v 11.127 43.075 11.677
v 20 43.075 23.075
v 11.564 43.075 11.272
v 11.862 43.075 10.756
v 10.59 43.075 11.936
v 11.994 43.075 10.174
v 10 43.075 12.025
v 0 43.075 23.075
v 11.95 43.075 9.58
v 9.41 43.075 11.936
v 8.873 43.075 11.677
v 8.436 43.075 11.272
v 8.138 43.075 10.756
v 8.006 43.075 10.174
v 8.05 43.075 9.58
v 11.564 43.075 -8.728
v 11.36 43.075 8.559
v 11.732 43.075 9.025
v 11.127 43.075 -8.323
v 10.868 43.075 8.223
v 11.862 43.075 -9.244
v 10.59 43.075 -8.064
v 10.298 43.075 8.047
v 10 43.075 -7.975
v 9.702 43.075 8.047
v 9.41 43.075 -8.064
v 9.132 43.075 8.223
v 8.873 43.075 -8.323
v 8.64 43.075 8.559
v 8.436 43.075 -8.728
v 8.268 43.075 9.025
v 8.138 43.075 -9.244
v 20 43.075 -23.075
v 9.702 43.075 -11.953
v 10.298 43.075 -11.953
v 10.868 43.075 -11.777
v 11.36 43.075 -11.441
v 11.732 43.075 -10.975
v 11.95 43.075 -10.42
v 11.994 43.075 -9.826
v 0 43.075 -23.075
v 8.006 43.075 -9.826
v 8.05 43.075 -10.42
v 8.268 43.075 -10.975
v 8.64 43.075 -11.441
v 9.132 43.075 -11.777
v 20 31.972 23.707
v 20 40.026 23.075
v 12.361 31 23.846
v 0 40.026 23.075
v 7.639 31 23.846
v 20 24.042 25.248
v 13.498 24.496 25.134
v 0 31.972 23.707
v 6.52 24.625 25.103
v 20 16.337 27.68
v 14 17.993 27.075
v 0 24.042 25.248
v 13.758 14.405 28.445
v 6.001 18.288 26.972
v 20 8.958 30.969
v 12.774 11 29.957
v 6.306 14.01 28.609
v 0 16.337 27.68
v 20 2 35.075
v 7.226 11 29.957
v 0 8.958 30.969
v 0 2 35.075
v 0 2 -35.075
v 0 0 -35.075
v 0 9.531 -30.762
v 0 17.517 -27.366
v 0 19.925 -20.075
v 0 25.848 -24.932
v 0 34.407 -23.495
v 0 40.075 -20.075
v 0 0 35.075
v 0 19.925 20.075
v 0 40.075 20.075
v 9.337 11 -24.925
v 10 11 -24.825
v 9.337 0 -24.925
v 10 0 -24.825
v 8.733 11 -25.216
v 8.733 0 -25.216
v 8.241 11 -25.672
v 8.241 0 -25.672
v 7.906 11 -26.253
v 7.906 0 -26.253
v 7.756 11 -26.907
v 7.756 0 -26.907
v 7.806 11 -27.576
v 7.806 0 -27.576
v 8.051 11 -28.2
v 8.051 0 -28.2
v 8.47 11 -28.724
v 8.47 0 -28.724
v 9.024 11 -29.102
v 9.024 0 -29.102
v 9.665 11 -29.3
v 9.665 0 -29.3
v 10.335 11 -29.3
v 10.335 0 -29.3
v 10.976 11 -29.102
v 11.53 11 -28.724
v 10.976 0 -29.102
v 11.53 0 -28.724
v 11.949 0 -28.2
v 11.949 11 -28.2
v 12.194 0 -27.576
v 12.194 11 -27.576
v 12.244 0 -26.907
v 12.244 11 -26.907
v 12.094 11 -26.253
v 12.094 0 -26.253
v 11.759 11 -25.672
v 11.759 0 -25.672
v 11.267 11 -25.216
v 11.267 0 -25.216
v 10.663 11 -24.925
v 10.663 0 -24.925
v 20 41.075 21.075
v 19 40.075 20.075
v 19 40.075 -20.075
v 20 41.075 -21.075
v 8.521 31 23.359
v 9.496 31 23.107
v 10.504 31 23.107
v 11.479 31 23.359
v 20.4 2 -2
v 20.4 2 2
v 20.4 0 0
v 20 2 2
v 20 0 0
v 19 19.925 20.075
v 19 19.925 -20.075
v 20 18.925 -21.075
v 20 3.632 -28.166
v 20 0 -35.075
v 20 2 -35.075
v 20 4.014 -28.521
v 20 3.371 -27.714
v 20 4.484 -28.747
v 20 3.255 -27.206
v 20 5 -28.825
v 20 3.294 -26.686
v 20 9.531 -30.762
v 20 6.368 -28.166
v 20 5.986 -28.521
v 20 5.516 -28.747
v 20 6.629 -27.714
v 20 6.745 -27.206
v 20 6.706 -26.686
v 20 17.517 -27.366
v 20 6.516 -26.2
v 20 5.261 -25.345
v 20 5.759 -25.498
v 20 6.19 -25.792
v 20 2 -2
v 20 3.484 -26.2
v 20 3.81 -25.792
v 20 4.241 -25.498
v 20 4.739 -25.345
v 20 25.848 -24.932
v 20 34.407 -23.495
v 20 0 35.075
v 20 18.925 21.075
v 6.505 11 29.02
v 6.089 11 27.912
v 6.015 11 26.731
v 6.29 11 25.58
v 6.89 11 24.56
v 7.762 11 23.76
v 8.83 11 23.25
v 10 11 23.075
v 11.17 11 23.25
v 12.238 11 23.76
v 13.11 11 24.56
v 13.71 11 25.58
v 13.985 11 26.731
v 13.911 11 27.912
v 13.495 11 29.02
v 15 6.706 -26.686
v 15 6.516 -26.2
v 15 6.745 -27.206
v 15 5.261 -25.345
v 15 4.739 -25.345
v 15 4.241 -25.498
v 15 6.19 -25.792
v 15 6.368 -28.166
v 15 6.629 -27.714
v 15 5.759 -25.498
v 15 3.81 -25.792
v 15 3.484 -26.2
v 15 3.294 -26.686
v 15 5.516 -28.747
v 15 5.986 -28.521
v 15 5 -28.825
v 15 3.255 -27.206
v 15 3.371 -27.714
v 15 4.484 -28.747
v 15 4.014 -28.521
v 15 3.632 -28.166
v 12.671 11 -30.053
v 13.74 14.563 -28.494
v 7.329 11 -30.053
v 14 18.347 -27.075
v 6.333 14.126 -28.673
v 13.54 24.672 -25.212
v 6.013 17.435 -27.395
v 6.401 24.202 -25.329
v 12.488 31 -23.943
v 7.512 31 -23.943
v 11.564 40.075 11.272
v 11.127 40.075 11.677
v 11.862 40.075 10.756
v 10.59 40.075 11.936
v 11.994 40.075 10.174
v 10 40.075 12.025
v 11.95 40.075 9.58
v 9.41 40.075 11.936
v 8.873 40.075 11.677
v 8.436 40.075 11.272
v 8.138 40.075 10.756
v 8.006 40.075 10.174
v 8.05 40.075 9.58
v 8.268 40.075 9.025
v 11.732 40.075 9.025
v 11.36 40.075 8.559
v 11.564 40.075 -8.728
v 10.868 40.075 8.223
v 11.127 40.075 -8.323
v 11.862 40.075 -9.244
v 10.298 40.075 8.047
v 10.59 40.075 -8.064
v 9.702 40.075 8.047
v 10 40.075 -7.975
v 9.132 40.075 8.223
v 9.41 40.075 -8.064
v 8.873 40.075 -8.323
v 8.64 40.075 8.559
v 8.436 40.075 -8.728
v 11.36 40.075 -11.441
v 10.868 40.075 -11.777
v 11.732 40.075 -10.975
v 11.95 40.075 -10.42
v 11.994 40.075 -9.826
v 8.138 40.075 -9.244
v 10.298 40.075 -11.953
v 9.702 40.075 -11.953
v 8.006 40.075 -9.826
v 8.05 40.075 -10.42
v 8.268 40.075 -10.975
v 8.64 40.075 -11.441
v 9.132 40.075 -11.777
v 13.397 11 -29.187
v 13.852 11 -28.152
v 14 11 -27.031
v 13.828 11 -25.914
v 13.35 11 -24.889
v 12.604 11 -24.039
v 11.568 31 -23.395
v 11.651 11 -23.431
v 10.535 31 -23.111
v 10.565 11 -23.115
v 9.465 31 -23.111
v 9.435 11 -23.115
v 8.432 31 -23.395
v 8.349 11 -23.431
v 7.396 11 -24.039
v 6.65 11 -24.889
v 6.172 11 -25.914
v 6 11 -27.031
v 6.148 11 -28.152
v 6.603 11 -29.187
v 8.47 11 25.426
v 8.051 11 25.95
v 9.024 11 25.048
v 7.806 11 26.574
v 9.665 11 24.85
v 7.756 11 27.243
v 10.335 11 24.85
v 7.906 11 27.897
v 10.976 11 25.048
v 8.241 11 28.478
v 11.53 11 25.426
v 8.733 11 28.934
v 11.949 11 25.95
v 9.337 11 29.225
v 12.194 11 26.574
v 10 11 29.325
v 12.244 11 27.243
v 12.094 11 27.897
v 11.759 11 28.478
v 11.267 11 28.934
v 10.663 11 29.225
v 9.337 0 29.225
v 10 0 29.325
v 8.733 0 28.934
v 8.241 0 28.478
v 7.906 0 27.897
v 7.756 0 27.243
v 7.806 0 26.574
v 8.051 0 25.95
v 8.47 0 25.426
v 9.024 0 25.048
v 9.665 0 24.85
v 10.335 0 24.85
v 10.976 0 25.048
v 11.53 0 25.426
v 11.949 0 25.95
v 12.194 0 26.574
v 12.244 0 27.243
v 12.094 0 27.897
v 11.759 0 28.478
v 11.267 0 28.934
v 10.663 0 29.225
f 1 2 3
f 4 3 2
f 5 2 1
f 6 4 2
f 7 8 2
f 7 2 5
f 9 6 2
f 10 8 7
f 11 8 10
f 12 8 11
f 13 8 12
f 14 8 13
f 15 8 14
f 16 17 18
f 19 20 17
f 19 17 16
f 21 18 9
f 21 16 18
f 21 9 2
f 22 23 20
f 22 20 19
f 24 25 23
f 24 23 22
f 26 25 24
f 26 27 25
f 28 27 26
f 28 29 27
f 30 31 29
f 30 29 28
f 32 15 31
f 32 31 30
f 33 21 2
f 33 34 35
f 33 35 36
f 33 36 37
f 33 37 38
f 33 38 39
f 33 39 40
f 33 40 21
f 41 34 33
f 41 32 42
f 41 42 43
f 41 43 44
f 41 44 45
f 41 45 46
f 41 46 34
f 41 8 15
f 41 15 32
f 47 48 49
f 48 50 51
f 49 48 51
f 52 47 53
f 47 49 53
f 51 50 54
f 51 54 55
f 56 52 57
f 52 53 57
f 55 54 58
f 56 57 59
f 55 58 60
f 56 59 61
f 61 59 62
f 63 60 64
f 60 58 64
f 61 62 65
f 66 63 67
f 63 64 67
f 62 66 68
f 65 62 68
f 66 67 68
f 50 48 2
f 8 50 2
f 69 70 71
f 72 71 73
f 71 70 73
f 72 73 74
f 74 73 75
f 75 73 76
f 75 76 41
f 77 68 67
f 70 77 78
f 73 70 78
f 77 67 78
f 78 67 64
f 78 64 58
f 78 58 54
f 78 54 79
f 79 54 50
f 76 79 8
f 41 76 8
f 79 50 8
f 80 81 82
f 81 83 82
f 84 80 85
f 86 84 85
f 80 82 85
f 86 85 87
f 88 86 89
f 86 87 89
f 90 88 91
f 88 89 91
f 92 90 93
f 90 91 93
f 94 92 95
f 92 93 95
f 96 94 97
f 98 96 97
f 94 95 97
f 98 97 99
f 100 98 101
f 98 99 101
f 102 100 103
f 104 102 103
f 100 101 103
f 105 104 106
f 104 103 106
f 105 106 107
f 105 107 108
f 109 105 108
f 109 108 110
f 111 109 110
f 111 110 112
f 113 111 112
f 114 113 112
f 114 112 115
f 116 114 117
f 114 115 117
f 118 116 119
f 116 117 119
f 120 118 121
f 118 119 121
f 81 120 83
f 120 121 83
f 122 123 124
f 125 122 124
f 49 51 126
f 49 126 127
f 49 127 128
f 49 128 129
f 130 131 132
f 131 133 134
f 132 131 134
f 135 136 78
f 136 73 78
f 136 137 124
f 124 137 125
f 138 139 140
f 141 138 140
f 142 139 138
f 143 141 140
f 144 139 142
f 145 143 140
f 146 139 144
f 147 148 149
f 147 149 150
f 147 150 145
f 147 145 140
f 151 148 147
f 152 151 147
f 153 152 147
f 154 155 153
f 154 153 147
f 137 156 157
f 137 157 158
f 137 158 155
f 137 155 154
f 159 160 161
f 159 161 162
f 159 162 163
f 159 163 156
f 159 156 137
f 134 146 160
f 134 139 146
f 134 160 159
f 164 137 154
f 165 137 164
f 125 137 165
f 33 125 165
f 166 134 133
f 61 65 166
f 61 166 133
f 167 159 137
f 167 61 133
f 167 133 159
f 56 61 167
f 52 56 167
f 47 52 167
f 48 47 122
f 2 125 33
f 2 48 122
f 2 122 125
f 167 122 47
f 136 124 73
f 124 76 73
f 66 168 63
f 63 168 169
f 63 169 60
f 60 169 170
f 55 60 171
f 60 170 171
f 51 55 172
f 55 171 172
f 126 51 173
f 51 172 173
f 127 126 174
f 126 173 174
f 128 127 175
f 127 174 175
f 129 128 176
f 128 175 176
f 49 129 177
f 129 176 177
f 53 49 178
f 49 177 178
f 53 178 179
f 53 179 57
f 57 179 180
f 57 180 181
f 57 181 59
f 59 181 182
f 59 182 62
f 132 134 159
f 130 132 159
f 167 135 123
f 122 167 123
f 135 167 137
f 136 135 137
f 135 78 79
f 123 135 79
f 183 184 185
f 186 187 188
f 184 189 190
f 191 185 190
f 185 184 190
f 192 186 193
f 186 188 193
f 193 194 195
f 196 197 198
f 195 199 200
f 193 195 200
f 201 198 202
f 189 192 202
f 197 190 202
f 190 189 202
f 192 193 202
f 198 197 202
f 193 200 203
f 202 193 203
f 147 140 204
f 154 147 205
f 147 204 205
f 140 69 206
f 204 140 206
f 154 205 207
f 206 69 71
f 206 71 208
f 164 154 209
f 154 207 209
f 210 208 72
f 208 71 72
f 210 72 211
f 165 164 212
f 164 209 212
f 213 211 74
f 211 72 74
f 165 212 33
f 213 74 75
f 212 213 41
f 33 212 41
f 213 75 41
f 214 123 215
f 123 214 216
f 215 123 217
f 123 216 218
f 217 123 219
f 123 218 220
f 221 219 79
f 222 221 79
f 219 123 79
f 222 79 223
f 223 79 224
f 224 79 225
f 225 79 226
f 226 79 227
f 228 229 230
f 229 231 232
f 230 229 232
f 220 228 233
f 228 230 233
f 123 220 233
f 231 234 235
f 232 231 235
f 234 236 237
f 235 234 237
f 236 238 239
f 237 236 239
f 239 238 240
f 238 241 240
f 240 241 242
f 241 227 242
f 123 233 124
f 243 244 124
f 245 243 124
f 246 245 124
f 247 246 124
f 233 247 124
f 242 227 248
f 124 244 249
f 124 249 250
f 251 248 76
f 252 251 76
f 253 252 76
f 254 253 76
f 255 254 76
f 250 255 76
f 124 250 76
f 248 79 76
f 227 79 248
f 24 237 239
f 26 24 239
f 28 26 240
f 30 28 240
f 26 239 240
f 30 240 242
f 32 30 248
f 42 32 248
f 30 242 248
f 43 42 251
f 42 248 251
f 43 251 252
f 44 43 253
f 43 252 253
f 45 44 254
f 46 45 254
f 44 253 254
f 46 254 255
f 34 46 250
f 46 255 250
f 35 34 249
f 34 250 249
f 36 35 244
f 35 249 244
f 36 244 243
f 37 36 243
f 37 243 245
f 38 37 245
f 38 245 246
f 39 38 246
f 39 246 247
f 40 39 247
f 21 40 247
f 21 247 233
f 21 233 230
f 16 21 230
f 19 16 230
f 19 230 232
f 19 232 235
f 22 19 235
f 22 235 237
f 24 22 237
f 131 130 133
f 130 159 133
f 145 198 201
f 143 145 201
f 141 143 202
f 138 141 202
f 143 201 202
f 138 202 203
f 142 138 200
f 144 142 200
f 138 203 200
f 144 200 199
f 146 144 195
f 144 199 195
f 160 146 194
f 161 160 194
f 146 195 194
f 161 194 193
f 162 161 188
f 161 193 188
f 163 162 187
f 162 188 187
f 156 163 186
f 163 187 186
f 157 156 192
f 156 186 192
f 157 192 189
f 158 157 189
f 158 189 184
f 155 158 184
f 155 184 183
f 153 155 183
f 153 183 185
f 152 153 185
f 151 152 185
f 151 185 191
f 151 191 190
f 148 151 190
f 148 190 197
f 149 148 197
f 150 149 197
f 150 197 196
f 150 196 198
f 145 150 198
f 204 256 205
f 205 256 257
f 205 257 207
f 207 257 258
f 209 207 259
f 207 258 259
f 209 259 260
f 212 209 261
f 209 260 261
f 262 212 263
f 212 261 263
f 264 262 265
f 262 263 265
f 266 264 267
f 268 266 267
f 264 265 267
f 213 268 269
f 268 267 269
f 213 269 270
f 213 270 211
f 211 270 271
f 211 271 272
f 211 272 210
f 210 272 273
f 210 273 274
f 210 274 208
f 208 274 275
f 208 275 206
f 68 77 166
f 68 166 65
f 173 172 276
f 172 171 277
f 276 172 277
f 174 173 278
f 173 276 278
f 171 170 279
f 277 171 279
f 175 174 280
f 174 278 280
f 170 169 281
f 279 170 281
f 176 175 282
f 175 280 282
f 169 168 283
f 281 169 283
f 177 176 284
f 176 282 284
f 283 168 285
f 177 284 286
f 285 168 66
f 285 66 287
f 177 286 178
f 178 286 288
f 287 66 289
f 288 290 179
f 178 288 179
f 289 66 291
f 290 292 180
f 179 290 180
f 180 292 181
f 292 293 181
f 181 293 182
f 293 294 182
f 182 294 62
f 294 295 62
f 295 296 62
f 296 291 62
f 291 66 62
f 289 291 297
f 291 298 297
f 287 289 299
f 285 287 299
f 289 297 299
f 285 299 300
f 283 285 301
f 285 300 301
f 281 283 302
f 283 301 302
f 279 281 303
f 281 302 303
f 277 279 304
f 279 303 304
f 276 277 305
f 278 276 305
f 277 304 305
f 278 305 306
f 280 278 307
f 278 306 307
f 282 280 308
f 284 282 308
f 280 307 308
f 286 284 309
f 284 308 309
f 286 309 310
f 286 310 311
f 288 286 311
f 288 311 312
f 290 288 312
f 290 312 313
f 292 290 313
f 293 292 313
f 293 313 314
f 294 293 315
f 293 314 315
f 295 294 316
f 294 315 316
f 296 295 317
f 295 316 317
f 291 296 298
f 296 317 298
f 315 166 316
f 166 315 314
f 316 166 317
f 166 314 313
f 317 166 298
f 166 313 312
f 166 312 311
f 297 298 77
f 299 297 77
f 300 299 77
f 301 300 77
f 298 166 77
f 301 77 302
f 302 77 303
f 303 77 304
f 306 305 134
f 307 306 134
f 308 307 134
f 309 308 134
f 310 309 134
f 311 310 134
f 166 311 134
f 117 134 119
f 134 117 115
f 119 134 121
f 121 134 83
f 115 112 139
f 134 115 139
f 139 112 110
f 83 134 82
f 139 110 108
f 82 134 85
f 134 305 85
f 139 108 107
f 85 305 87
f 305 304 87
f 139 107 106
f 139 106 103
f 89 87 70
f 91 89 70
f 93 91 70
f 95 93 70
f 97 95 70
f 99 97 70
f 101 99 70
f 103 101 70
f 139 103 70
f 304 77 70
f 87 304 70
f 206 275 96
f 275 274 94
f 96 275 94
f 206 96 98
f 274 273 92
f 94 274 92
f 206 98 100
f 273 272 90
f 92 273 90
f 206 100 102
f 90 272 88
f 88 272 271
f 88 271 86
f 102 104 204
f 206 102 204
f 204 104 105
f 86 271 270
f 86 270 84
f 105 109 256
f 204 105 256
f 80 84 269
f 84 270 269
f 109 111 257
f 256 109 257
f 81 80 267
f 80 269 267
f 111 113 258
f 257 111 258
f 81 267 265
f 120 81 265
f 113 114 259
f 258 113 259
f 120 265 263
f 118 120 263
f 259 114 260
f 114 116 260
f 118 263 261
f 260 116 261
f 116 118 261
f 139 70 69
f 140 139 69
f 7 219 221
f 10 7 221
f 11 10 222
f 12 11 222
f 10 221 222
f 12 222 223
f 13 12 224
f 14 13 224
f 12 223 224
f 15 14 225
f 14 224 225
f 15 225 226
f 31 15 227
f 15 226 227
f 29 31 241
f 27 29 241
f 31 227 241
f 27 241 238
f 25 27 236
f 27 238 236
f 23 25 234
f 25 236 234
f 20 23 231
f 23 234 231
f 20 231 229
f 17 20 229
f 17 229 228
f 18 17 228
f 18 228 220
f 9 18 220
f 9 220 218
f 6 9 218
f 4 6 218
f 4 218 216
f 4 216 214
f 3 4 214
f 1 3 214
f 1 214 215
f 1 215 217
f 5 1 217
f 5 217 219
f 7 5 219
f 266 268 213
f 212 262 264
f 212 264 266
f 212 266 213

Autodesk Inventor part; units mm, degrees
ref_plane "YZ Plane" through (0, 0, 0) normal (1, 0, 0) x (0, 1, 0)
ref_plane "XZ Plane" through (0, 0, 0) normal (0, 1, 0) x (-1, 0, 0)
ref_plane "XY Plane" through (0, 0, 0) normal (0, 0, 1) x (1, 0, 0)
sketch "Sketch1" plane through (0, 0, 0) normal (1, 0, 0) x (0, 1, 0)
  line L0 (0, 0) -> (0, -35.075)
  line L1 (0, -35.075) -> (2, -35.075)
  line L2 (19.925, 20.075) -> (40.075, 20.075)
  line L3 (40.075, 20.075) -> (40.075, -20.075)
  line L4 (40.075, -20.075) -> (19.925, -20.075)
  line L5 (19.925, -20.075) -> (19.925, 20.075)
  line L6 (19.925, 20.075) -> (40.075, -20.075) construction
  line L7 (40.075, 20.075) -> (19.925, -20.075) construction
  line L8 (16.925, 23.075) -> (43.075, 23.075)
  line L9 (43.075, 23.075) -> (43.075, -23.075)
  line L10 (43.075, -23.075) -> (16.925, -23.075)
  line L11 (16.925, -23.075) -> (16.925, 23.075)
  line L12 (16.925, 23.075) -> (43.075, -23.075) construction
  line L13 (43.075, 23.075) -> (16.925, -23.075) construction
  line L14 (0, 0) -> (0, 35.075)
  line L15 (0, 35.075) -> (2, 35.075)
  arc A0 (2, 35.075) -> (43.075, 23.075) centre (41.5508, 94.1558) ccw
  arc A1 (43.075, -23.075) -> (2, -35.075) centre (42.3004, -96.7217) ccw
  line L16 (-8.615, 0) -> (51.69, 0) projected
  point P0 (20, 0)
  point P1 (40.1, 0)
  point P2 (30, 0)
  point P3 (30, 23.075)
  point P4 (30.025, -23.075)
  point P5 (30, 0)
  dimension "d0" = 35.075
  dimension "d1" = 2
  dimension "d2" = 20
  dimension "d4" = 20.15
  dimension "d5" = 40.15
  dimension "d6" = 46.15
  dimension "d7" = 26.15
  dimension "d8" = 35.075
extrude "Extrusion1" add sketch "Sketch1" along normal blind 20 contours L10 L11 L16 L5 L4 L3 L9 | L16 L11 L10 A1 L1 L0 | L14 L15 A0 L8 L11 L16 | L11 L8 A0 L9 L16 L3 L2 L5 | L8 A0
sketch "Sketch2" plane through (0, 43.075, 23.075) normal (0, 1, 0) x (1, 0, 0)
  line L0 (0, 46.15) -> (0, 0) projected
  line L1 (0, 0) -> (20, 0) projected
  line L2 (20, 46.15) -> (20, 0) projected
  line L3 (0, 46.15) -> (20, 46.15) projected
  line L4 (0, 3) -> (20, 3) projected
  line L5 (0, 3) -> (20, 3) projected
  point P0 (0, 23.075)
  point P1 (10, 13.05)
  point P2 (10, 33.05)
  dimension "d33" = 20
  dimension "d34" = 10.05
hole "Hole1" at (10, 43.075, 10.025) at (10, 43.075, -9.975) direction (0, -1, 0) diameter 4 end up to surface
ref_plane "Work Plane1" through (0, 11, -35.075) normal (0, -1, 0) x (1, 0, 0)
sketch "Sketch3" plane through (0, 11, -35.075) normal (0, -1, 0) x (1, 0, 0)
  circle A0 centre (10, 45.1) radius 2 projected
  line L0 (0, 12) -> (0, 58.15) projected
  line L1 (0, 58.15) -> (20, 58.15) projected
  line L2 (20, 12) -> (20, 58.15) projected
  line L3 (0, 12) -> (20, 12) projected
  line L4 (0, 55.15) -> (0, 15) projected
  line L5 (0, 55.15) -> (20, 55.15) projected
  line L6 (20, 15) -> (20, 55.15) projected
  line L7 (0, 15) -> (20, 15) projected
  circle A1 centre (10, 62.15) radius 4
  circle A2 centre (10, 8) radius 4
  point P0 (0, 35.075)
  dimension "d19" = 4
  dimension "d20" = 4
  dimension "d30" = 8
  dimension "d31" = 8
extrude "Extrusion2" cut sketch "Sketch3" against normal blind 20 contours A1 | A2
hole "Hole2" at (10, 11, 27.075) at (10, 11, -27.075) direction (0, -1, 0) diameter 4.5 end through all
chamfer "Chamfer1" distance 1 angle 45 4 edges at (20, 40.075, 0) (20, 30, 20.075) (20, 19.925, 0) (20, 30, -20.075)
sketch "Sketch4" plane through (20, 0, 0) normal (1, 0, 0) x (0, 0, -1)
  line L0 (0, -8.615) -> (0, 51.69) projected
  line L1 (-35.075, 0) -> (35.075, 0) projected
  line L2 (0, 0) -> (2, 2)
  line L3 (2, 2) -> (-2, 2)
  line L4 (-2, 2) -> (0, 0)
extrude "Extrusion3" add sketch "Sketch4" along normal blind 0.4
sketch "Sketch5" plane through (20, 0, 0) normal (1, 0, 0) x (0, 0, -1)
  line L0 (0, 0) -> (35.075, 0) projected
  line L1 (35.075, 0) -> (35.075, 2) projected
  point P0 (27.075, 5)
  dimension "d42" = 5
  dimension "d43" = 8
hole "Hole3" at (20, 5, -27.075) direction (-1, 0, 0) diameter 3.5 depth 5
equation "\"d8\" = d0"
equation "\"d20\" = d19"
equation "\"d31\" = d30"
properties part number "espaceur_20mm_v3"
